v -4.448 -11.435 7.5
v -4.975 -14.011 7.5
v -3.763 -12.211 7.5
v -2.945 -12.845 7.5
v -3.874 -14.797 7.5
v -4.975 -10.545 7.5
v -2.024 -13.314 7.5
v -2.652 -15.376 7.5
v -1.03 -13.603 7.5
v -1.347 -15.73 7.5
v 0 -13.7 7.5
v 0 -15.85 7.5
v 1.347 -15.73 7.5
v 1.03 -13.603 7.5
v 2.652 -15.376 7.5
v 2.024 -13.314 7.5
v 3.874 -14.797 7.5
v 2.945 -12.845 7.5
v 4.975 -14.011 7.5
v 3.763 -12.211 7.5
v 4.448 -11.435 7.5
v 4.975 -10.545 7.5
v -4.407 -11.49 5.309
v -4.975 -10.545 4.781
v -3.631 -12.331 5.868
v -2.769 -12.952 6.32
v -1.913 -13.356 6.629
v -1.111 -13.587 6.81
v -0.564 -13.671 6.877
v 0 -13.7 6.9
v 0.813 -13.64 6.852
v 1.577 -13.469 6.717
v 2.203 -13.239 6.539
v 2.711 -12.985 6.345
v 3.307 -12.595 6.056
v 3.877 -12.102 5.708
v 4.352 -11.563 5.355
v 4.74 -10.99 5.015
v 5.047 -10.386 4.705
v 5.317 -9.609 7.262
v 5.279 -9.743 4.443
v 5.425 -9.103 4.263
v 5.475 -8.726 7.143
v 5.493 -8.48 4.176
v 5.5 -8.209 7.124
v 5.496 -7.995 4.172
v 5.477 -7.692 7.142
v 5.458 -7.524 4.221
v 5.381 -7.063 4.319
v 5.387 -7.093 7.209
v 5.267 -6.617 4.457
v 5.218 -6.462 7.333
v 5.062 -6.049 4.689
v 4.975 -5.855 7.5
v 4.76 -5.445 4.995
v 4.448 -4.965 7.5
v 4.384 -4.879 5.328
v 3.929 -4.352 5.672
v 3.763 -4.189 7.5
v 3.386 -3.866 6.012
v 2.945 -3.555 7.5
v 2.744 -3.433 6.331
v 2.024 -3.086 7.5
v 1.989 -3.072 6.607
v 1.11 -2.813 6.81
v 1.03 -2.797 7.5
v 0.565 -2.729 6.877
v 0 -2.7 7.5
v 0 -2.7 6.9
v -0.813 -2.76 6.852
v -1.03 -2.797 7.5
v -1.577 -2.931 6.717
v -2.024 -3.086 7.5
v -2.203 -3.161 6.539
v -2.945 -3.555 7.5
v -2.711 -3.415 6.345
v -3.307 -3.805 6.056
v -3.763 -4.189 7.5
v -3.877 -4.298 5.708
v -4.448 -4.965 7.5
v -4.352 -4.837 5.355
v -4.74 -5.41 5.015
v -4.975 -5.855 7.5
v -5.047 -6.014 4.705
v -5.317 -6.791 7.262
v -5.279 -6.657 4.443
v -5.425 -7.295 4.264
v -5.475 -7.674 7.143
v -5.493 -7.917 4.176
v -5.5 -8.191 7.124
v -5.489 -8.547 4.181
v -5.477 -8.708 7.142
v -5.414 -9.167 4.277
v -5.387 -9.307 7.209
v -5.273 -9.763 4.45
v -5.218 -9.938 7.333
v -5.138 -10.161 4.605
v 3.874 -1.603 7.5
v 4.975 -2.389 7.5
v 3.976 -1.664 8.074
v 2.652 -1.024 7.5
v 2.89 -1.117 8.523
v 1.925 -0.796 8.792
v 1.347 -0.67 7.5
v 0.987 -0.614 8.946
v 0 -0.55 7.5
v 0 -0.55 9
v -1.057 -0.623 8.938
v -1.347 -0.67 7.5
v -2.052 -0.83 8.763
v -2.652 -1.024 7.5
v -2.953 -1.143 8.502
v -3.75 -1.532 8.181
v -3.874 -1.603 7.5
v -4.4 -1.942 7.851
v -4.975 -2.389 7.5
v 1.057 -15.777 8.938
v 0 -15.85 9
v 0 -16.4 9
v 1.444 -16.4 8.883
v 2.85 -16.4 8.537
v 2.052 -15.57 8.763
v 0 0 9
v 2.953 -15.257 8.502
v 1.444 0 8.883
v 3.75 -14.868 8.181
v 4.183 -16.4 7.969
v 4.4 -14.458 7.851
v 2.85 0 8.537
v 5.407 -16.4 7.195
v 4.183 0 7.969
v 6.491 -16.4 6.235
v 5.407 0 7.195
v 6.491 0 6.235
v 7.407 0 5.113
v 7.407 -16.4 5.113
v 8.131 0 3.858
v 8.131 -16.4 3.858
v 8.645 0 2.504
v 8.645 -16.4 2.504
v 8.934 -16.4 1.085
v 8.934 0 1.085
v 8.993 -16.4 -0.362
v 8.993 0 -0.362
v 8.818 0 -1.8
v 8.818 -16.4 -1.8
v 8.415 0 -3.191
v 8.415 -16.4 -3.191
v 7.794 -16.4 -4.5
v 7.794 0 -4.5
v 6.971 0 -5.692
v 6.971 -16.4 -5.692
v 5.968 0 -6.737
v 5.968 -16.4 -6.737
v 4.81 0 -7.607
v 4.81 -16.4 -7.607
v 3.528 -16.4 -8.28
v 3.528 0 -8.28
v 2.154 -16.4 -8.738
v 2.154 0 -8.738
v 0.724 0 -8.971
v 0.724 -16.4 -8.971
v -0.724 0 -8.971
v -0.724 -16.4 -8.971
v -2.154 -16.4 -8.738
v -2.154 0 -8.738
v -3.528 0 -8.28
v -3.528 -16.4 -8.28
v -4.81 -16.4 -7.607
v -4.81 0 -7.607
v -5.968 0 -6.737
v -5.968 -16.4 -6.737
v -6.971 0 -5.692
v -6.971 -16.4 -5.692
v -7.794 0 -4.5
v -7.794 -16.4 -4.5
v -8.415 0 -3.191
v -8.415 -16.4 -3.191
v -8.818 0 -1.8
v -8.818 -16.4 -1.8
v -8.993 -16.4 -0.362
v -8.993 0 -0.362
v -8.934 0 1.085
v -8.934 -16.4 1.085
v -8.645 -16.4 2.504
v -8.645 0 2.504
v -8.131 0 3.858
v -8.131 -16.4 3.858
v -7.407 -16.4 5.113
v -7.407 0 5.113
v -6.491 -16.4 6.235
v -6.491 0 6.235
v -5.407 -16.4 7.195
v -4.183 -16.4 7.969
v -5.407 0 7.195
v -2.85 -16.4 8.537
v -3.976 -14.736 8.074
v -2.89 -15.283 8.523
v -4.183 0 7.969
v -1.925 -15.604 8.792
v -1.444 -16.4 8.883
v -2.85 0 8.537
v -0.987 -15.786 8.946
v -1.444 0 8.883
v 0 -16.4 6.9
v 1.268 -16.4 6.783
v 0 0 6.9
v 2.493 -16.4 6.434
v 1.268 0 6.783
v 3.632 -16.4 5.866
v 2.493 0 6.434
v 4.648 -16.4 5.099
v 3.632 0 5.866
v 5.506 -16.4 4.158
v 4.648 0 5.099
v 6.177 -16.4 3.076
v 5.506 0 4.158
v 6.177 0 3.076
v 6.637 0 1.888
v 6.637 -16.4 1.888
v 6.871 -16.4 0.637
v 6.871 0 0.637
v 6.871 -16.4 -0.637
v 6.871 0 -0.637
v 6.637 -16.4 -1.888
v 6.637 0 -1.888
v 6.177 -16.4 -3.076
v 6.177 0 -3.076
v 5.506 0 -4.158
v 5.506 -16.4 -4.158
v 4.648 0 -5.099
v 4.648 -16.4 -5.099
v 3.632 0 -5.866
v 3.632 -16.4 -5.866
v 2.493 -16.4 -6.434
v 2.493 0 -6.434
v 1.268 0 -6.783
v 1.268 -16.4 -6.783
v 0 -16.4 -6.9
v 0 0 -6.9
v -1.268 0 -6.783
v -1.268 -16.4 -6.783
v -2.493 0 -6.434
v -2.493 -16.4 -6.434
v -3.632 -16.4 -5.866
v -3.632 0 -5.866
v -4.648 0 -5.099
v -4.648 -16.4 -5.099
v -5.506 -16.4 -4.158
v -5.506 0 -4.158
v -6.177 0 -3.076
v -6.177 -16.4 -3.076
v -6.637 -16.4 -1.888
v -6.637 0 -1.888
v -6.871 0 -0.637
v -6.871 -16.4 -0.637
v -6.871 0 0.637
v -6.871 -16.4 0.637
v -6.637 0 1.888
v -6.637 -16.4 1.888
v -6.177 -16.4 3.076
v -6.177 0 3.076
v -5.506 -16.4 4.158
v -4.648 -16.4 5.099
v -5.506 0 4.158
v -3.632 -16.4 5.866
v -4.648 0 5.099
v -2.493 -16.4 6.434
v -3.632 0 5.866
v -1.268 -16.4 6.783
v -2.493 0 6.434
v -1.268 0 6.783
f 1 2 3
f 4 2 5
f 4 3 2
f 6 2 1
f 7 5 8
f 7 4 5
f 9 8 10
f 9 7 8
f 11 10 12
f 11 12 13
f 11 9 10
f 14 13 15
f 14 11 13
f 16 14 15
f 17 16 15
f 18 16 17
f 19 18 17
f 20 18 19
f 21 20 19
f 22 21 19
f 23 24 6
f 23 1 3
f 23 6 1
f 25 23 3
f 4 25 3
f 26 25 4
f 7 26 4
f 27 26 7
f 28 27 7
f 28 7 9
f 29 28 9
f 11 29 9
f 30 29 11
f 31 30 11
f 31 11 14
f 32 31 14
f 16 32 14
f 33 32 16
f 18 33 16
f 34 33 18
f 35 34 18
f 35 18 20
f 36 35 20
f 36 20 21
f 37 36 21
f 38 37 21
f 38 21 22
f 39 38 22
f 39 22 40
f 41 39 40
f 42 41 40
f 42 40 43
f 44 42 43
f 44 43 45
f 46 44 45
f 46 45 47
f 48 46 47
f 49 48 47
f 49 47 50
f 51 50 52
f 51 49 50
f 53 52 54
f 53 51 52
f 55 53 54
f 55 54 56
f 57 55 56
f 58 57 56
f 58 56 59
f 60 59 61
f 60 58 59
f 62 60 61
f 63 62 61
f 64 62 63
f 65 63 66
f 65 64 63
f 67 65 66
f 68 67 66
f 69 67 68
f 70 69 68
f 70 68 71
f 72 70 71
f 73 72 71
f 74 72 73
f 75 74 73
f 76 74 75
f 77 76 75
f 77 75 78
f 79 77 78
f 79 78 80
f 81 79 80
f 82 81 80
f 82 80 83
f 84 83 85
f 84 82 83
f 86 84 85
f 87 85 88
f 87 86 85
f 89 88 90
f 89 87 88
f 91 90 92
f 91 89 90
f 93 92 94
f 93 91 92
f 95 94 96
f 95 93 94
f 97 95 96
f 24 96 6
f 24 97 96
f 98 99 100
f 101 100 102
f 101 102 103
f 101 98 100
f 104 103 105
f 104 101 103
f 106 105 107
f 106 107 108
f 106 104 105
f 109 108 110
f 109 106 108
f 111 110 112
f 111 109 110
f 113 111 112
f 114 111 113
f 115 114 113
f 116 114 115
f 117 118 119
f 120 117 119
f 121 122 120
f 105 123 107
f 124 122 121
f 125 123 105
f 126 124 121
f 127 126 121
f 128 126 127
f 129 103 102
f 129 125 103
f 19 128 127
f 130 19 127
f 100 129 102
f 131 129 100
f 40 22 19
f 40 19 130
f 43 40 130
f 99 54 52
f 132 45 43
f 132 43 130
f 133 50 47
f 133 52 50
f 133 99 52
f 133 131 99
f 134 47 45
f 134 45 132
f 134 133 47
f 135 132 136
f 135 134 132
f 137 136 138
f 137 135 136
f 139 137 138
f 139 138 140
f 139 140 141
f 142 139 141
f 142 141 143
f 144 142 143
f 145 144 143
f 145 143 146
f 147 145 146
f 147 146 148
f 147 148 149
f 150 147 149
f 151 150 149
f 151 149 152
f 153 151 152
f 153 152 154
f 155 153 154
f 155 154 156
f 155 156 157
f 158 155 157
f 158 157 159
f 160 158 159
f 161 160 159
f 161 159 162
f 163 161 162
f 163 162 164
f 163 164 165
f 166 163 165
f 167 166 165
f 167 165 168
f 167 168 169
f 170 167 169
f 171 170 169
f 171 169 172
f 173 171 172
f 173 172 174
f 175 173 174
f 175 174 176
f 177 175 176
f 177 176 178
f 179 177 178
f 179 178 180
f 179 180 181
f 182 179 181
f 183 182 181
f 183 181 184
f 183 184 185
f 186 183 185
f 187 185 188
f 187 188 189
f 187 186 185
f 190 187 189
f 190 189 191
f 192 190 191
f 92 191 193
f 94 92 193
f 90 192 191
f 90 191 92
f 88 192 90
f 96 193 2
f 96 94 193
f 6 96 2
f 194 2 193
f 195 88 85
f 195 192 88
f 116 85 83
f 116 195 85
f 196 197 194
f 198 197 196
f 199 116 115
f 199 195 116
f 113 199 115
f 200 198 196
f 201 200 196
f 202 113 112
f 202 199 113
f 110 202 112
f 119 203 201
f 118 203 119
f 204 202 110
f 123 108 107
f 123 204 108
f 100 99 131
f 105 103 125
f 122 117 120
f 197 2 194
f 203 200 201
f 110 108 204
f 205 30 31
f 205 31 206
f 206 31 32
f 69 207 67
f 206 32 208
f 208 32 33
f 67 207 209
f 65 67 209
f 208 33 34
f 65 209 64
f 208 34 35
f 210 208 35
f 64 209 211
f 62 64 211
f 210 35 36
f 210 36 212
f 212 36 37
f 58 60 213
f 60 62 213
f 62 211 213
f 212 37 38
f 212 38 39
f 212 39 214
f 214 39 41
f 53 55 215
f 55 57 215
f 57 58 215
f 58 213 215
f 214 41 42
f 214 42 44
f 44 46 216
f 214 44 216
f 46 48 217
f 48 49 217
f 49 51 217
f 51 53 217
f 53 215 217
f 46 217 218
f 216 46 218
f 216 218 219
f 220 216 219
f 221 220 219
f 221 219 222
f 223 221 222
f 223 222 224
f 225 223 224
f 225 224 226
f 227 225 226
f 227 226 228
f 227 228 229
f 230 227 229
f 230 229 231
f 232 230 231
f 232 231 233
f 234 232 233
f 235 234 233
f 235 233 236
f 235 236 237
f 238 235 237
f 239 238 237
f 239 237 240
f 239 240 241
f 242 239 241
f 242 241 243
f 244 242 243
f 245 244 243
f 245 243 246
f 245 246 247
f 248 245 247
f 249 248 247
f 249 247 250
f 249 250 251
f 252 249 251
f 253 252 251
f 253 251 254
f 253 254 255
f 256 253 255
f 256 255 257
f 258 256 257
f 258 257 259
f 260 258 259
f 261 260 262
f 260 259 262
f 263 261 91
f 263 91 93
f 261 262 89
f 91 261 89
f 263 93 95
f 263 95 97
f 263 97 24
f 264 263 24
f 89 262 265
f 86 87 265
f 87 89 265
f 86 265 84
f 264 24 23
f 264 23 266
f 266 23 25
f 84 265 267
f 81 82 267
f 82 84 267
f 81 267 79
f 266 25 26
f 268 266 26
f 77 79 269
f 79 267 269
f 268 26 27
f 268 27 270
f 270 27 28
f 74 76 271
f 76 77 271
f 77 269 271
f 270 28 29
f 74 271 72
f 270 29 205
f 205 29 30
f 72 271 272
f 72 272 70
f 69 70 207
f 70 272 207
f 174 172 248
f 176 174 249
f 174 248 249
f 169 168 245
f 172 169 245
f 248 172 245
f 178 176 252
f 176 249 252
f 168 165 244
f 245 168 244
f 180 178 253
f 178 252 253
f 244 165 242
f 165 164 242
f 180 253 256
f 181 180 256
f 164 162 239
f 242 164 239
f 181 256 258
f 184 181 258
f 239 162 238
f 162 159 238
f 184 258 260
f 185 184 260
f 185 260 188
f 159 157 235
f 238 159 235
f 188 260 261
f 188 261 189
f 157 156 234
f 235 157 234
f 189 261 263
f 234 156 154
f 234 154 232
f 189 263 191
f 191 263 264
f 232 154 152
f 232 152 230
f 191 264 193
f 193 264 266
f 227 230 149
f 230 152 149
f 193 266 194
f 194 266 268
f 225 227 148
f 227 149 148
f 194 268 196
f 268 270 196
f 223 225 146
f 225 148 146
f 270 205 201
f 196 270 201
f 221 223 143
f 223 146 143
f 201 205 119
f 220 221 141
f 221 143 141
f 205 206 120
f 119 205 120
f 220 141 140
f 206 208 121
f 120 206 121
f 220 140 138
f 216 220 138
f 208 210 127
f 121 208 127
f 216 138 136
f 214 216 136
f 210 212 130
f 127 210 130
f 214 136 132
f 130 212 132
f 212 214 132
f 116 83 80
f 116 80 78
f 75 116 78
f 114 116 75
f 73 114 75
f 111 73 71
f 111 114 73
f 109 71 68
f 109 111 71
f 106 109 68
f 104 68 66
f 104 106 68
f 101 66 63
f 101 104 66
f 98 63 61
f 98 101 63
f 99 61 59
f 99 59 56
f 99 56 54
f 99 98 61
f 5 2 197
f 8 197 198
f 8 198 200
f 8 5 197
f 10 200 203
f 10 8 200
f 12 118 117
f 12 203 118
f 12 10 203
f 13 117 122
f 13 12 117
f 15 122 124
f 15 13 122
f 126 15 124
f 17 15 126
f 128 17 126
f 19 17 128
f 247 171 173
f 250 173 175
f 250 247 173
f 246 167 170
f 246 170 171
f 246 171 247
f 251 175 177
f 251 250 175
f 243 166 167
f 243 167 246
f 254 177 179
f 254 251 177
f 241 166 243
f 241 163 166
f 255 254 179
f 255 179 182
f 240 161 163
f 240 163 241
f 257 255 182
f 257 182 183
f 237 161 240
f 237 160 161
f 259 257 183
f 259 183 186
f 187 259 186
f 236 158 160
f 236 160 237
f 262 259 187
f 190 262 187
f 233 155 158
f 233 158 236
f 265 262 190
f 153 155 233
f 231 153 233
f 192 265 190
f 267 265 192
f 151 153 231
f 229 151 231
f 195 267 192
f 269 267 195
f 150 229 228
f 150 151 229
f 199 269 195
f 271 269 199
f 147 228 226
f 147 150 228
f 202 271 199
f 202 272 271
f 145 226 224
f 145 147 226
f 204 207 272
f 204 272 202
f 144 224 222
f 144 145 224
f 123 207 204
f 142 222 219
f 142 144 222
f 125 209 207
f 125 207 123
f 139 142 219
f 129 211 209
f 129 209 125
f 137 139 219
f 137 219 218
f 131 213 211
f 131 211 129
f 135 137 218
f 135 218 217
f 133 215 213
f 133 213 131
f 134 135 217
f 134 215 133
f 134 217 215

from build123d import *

# Parameters (mm, degrees)
SKETCH1_R               = 9
SKETCH1_R_2             = 6.9
BOSS_EXTRUDE1_DEPTH     = 16.4
CUT_EXTRUDE5_START      = 7.5
SKETCH3_R               = 7.65
CUT_EXTRUDE5_DEPTH      = 14.259576104
CUT_EXTRUDE6_DEPTH      = 25.944137756
CUT_EXTRUDE6_DEPTH_BACK = 7
SKETCH6_R               = 5.5


with BuildPart() as part:
    # Sketch1 → Boss-Extrude1 (new body)
    with BuildSketch(Plane(origin=(0, 0, 0), x_dir=(1, 0, 0), z_dir=(0, 1, 0))):
        with Locations(Location((0, 0, 0), (0, 0, 270))):
            Circle(SKETCH1_R)
        with Locations(Location((0, 0, 0), (0, 0, 270))):
            Circle(SKETCH1_R_2, mode=Mode.SUBTRACT)
    extrude(amount=-BOSS_EXTRUDE1_DEPTH)

    # Sketch3 → Cut-Extrude5 (cut, through all)
    with BuildSketch(Plane.XY.offset(CUT_EXTRUDE5_START)):
        with Locations((0, -8.2)):
            Circle(SKETCH3_R)
    extrude(amount=CUT_EXTRUDE5_DEPTH, mode=Mode.SUBTRACT)

    # Sketch6 → Cut-Extrude6 (cut, two sides: drawn at the far end of the back side and taken through both)
    with BuildSketch(Plane.XY.offset(7.5).offset(-CUT_EXTRUDE6_DEPTH_BACK)):
        with Locations(Location((0, -8.2, 0), (0, 0, 205.239401821))):
            Circle(SKETCH6_R)
    extrude(amount=CUT_EXTRUDE6_DEPTH + CUT_EXTRUDE6_DEPTH_BACK, mode=Mode.SUBTRACT)


solid = part.part
